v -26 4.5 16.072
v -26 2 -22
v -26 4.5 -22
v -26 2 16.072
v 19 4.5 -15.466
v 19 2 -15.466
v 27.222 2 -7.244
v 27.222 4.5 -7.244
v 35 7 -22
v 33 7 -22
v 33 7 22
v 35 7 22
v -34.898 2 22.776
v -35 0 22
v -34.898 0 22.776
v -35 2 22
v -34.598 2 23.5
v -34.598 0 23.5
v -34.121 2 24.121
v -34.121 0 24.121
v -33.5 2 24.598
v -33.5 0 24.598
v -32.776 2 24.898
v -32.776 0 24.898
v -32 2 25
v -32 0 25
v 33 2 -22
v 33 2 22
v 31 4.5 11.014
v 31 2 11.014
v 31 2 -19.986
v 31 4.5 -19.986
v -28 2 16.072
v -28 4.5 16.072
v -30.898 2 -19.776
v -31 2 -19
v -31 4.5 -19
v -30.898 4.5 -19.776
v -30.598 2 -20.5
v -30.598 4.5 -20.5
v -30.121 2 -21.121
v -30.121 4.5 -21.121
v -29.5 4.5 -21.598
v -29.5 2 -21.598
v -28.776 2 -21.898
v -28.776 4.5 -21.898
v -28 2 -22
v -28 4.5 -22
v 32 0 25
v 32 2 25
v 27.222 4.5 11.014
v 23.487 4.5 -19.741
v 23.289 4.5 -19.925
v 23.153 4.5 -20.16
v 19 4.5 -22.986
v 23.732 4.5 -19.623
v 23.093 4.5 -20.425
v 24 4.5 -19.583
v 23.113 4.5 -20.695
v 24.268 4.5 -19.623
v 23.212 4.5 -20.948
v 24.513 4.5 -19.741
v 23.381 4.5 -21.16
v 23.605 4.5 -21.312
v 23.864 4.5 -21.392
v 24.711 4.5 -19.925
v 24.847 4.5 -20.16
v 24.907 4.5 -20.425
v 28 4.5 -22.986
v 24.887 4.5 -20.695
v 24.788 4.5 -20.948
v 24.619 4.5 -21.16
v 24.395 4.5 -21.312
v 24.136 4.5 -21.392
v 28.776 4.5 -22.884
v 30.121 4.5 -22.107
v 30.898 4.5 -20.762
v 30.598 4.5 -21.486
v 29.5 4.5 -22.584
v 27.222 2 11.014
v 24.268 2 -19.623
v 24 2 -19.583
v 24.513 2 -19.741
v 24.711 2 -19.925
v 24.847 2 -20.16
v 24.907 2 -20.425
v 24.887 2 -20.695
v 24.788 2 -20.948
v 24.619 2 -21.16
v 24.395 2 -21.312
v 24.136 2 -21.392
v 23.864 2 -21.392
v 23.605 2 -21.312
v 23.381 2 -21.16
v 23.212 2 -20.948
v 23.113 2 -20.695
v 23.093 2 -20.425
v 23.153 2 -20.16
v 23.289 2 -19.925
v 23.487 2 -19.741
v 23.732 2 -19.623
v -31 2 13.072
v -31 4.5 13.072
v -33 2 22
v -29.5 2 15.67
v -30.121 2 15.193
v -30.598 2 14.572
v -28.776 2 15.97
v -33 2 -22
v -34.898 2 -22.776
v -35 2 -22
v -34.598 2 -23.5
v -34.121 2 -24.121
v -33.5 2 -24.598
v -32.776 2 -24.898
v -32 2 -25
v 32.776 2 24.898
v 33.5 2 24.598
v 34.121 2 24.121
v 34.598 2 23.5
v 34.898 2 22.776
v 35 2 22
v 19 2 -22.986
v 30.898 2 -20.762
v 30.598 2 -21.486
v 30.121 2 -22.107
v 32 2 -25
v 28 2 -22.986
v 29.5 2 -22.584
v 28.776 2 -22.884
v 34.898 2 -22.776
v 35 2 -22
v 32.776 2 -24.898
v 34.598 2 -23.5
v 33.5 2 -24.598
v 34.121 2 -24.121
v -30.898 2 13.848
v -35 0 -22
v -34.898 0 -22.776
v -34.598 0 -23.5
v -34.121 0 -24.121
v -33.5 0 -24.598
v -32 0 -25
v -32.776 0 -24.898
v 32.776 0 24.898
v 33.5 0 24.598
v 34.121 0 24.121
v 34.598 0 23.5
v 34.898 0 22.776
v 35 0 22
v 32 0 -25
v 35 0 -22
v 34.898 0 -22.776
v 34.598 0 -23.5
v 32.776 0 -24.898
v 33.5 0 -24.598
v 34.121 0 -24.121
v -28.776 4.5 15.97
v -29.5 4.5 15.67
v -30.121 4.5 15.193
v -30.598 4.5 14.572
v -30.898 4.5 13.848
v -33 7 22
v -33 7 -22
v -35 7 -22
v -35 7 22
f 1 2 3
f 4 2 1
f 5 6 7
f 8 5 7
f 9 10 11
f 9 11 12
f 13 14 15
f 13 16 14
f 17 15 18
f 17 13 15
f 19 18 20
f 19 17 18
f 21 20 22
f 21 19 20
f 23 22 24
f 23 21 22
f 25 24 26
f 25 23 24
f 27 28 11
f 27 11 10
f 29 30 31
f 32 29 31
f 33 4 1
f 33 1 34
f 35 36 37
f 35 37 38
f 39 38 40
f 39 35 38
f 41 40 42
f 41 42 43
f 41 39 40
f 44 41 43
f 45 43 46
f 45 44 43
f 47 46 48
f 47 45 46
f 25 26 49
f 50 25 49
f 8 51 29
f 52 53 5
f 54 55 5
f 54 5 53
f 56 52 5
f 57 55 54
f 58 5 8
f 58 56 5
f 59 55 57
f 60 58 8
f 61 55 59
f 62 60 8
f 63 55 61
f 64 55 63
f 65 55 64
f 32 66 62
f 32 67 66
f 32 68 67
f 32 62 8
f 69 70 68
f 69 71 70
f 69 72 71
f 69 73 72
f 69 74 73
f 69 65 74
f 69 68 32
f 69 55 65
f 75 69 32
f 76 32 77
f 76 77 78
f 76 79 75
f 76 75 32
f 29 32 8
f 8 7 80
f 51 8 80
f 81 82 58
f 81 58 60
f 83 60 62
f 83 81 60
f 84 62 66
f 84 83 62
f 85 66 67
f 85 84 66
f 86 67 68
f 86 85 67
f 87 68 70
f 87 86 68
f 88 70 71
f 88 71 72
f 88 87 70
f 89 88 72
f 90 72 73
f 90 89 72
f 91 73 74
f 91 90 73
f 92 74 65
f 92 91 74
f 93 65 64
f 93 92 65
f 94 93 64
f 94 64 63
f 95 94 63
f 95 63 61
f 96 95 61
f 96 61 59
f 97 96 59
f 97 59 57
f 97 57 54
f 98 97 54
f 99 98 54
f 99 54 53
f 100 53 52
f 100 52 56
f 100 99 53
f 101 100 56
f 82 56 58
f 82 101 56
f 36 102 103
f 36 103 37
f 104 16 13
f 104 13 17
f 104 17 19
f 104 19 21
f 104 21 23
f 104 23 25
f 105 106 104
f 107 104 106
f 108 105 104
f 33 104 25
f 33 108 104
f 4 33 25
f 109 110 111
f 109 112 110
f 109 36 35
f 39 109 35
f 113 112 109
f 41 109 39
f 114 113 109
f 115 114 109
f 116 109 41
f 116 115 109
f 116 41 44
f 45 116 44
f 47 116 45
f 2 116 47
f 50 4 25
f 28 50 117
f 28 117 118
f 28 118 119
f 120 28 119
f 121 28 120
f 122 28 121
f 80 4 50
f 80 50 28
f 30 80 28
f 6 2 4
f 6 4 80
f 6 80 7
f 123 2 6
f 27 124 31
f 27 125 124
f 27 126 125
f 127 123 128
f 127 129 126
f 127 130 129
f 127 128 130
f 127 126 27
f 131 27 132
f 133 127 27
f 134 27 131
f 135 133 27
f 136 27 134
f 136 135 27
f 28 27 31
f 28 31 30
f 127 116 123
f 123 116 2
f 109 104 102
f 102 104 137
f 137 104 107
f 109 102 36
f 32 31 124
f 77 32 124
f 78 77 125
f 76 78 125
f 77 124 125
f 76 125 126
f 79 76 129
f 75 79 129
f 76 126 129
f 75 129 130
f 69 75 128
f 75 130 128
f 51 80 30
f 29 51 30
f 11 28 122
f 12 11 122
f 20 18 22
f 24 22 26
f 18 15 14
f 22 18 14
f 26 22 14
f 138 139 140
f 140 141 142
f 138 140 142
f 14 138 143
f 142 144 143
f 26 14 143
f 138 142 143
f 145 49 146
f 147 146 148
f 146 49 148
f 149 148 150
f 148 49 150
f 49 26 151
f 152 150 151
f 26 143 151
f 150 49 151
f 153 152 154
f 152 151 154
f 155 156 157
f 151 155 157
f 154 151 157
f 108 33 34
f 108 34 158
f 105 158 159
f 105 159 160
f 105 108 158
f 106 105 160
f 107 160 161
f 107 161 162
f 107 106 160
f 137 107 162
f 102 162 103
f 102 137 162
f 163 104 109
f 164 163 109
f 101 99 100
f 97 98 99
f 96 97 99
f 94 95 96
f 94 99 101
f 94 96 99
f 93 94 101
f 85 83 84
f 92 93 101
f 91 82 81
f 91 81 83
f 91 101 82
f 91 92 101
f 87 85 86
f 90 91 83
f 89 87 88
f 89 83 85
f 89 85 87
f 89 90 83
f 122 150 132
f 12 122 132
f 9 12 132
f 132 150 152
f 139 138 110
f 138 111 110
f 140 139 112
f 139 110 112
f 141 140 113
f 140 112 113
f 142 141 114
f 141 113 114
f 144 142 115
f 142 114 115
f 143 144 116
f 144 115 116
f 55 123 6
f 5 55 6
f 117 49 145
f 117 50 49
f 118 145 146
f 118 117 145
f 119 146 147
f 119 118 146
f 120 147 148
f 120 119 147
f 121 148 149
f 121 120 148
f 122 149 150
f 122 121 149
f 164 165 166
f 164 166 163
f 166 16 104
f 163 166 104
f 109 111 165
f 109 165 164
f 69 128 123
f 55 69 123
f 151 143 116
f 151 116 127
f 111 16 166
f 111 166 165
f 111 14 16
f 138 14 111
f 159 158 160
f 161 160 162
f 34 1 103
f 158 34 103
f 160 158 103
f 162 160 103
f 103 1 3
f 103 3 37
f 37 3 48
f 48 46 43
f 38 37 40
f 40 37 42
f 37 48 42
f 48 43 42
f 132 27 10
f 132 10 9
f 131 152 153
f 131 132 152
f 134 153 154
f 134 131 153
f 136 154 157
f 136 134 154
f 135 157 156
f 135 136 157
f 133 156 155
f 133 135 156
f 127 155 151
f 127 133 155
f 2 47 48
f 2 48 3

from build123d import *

# Parameters (mm, degrees)
SKETCH_1_W      = 70
SKETCH_1_H      = 50
EXTRUDE_1_DEPTH = 2
FILLET_1_R      = 3
SKETCH_2_W      = 2
SKETCH_2_H      = 44
EXTRUDE_2_DEPTH = 5
SKETCH_3_R      = 0.91
EXTRUDE_3_DEPTH = 2.5


with BuildPart() as part:
    # 草图1 → 凸台-拉伸1 (new body)
    with BuildSketch(Plane(origin=(0, 0, 0), x_dir=(1, 0, 0), z_dir=(0, 1, 0))):
        Rectangle(SKETCH_1_W, SKETCH_1_H)
    extrude(amount=EXTRUDE_1_DEPTH)

    # 圆角1
    fillet_1_edges = [part.edges().sort_by_distance(p)[0] for p in [
        (35, 1, 25),
        (-35, 1, 25),
        (-35, 1, -25),
        (35, 1, -25),
    ]]
    fillet(fillet_1_edges, radius=FILLET_1_R)

    # 草图2 → 凸台-拉伸2 (add)
    with BuildSketch(Plane(origin=(0, 2, 0), x_dir=(1, 0, 0), z_dir=(0, 1, 0))):
        with Locations((-34, 0)):
            Rectangle(SKETCH_2_W, SKETCH_2_H)
        with Locations((34, 0)):
            Rectangle(SKETCH_2_W, SKETCH_2_H)
    extrude(amount=EXTRUDE_2_DEPTH)

    # 草图3 → 凸台-拉伸3 (add)
    # profile 1 of 2: a face of its own
    with BuildSketch(Plane(origin=(0, 2, 0), x_dir=(1, 0, 0), z_dir=(0, 1, 0))):
        with BuildLine():
            Line((28, 22.985971126), (19, 22.985971126))
            Line((19, 22.985971126), (19, 15.46603773))
            Line((19, 15.46603773), (27.222114772, 7.243922958))
            Line((27.222114772, 7.243922958), (27.222114772, -11.014028874))
            Line((27.222114772, -11.014028874), (31, -11.014028874))
            Line((31, -11.014028874), (31, 19.985971126))
            ThreePointArc((31, 19.985971126), (30.121320344, 22.10729147), (28, 22.985971126))
        make_face()
        with Locations(Location((24, 20.49257992, 0), (0, 0, 270))):
            Circle(SKETCH_3_R, mode=Mode.SUBTRACT)
    # profile 2 of 2: a face of its own
    with BuildSketch(Plane(origin=(0, 2, 0), x_dir=(1, 0, 0), z_dir=(0, 1, 0))):
        with BuildLine():
            Line((-28, 22), (-26, 22))
            Line((-26, 22), (-26, -16.071759555))
            Line((-26, -16.071759555), (-28, -16.071759555))
            ThreePointArc((-28, -16.071759555), (-30.121320344, -15.193079899), (-31, -13.071759555))
            Line((-31, -13.071759555), (-31, 19))
            ThreePointArc((-31, 19), (-30.121320344, 21.121320344), (-28, 22))
        make_face()
    extrude(amount=EXTRUDE_3_DEPTH)


solid = part.part
